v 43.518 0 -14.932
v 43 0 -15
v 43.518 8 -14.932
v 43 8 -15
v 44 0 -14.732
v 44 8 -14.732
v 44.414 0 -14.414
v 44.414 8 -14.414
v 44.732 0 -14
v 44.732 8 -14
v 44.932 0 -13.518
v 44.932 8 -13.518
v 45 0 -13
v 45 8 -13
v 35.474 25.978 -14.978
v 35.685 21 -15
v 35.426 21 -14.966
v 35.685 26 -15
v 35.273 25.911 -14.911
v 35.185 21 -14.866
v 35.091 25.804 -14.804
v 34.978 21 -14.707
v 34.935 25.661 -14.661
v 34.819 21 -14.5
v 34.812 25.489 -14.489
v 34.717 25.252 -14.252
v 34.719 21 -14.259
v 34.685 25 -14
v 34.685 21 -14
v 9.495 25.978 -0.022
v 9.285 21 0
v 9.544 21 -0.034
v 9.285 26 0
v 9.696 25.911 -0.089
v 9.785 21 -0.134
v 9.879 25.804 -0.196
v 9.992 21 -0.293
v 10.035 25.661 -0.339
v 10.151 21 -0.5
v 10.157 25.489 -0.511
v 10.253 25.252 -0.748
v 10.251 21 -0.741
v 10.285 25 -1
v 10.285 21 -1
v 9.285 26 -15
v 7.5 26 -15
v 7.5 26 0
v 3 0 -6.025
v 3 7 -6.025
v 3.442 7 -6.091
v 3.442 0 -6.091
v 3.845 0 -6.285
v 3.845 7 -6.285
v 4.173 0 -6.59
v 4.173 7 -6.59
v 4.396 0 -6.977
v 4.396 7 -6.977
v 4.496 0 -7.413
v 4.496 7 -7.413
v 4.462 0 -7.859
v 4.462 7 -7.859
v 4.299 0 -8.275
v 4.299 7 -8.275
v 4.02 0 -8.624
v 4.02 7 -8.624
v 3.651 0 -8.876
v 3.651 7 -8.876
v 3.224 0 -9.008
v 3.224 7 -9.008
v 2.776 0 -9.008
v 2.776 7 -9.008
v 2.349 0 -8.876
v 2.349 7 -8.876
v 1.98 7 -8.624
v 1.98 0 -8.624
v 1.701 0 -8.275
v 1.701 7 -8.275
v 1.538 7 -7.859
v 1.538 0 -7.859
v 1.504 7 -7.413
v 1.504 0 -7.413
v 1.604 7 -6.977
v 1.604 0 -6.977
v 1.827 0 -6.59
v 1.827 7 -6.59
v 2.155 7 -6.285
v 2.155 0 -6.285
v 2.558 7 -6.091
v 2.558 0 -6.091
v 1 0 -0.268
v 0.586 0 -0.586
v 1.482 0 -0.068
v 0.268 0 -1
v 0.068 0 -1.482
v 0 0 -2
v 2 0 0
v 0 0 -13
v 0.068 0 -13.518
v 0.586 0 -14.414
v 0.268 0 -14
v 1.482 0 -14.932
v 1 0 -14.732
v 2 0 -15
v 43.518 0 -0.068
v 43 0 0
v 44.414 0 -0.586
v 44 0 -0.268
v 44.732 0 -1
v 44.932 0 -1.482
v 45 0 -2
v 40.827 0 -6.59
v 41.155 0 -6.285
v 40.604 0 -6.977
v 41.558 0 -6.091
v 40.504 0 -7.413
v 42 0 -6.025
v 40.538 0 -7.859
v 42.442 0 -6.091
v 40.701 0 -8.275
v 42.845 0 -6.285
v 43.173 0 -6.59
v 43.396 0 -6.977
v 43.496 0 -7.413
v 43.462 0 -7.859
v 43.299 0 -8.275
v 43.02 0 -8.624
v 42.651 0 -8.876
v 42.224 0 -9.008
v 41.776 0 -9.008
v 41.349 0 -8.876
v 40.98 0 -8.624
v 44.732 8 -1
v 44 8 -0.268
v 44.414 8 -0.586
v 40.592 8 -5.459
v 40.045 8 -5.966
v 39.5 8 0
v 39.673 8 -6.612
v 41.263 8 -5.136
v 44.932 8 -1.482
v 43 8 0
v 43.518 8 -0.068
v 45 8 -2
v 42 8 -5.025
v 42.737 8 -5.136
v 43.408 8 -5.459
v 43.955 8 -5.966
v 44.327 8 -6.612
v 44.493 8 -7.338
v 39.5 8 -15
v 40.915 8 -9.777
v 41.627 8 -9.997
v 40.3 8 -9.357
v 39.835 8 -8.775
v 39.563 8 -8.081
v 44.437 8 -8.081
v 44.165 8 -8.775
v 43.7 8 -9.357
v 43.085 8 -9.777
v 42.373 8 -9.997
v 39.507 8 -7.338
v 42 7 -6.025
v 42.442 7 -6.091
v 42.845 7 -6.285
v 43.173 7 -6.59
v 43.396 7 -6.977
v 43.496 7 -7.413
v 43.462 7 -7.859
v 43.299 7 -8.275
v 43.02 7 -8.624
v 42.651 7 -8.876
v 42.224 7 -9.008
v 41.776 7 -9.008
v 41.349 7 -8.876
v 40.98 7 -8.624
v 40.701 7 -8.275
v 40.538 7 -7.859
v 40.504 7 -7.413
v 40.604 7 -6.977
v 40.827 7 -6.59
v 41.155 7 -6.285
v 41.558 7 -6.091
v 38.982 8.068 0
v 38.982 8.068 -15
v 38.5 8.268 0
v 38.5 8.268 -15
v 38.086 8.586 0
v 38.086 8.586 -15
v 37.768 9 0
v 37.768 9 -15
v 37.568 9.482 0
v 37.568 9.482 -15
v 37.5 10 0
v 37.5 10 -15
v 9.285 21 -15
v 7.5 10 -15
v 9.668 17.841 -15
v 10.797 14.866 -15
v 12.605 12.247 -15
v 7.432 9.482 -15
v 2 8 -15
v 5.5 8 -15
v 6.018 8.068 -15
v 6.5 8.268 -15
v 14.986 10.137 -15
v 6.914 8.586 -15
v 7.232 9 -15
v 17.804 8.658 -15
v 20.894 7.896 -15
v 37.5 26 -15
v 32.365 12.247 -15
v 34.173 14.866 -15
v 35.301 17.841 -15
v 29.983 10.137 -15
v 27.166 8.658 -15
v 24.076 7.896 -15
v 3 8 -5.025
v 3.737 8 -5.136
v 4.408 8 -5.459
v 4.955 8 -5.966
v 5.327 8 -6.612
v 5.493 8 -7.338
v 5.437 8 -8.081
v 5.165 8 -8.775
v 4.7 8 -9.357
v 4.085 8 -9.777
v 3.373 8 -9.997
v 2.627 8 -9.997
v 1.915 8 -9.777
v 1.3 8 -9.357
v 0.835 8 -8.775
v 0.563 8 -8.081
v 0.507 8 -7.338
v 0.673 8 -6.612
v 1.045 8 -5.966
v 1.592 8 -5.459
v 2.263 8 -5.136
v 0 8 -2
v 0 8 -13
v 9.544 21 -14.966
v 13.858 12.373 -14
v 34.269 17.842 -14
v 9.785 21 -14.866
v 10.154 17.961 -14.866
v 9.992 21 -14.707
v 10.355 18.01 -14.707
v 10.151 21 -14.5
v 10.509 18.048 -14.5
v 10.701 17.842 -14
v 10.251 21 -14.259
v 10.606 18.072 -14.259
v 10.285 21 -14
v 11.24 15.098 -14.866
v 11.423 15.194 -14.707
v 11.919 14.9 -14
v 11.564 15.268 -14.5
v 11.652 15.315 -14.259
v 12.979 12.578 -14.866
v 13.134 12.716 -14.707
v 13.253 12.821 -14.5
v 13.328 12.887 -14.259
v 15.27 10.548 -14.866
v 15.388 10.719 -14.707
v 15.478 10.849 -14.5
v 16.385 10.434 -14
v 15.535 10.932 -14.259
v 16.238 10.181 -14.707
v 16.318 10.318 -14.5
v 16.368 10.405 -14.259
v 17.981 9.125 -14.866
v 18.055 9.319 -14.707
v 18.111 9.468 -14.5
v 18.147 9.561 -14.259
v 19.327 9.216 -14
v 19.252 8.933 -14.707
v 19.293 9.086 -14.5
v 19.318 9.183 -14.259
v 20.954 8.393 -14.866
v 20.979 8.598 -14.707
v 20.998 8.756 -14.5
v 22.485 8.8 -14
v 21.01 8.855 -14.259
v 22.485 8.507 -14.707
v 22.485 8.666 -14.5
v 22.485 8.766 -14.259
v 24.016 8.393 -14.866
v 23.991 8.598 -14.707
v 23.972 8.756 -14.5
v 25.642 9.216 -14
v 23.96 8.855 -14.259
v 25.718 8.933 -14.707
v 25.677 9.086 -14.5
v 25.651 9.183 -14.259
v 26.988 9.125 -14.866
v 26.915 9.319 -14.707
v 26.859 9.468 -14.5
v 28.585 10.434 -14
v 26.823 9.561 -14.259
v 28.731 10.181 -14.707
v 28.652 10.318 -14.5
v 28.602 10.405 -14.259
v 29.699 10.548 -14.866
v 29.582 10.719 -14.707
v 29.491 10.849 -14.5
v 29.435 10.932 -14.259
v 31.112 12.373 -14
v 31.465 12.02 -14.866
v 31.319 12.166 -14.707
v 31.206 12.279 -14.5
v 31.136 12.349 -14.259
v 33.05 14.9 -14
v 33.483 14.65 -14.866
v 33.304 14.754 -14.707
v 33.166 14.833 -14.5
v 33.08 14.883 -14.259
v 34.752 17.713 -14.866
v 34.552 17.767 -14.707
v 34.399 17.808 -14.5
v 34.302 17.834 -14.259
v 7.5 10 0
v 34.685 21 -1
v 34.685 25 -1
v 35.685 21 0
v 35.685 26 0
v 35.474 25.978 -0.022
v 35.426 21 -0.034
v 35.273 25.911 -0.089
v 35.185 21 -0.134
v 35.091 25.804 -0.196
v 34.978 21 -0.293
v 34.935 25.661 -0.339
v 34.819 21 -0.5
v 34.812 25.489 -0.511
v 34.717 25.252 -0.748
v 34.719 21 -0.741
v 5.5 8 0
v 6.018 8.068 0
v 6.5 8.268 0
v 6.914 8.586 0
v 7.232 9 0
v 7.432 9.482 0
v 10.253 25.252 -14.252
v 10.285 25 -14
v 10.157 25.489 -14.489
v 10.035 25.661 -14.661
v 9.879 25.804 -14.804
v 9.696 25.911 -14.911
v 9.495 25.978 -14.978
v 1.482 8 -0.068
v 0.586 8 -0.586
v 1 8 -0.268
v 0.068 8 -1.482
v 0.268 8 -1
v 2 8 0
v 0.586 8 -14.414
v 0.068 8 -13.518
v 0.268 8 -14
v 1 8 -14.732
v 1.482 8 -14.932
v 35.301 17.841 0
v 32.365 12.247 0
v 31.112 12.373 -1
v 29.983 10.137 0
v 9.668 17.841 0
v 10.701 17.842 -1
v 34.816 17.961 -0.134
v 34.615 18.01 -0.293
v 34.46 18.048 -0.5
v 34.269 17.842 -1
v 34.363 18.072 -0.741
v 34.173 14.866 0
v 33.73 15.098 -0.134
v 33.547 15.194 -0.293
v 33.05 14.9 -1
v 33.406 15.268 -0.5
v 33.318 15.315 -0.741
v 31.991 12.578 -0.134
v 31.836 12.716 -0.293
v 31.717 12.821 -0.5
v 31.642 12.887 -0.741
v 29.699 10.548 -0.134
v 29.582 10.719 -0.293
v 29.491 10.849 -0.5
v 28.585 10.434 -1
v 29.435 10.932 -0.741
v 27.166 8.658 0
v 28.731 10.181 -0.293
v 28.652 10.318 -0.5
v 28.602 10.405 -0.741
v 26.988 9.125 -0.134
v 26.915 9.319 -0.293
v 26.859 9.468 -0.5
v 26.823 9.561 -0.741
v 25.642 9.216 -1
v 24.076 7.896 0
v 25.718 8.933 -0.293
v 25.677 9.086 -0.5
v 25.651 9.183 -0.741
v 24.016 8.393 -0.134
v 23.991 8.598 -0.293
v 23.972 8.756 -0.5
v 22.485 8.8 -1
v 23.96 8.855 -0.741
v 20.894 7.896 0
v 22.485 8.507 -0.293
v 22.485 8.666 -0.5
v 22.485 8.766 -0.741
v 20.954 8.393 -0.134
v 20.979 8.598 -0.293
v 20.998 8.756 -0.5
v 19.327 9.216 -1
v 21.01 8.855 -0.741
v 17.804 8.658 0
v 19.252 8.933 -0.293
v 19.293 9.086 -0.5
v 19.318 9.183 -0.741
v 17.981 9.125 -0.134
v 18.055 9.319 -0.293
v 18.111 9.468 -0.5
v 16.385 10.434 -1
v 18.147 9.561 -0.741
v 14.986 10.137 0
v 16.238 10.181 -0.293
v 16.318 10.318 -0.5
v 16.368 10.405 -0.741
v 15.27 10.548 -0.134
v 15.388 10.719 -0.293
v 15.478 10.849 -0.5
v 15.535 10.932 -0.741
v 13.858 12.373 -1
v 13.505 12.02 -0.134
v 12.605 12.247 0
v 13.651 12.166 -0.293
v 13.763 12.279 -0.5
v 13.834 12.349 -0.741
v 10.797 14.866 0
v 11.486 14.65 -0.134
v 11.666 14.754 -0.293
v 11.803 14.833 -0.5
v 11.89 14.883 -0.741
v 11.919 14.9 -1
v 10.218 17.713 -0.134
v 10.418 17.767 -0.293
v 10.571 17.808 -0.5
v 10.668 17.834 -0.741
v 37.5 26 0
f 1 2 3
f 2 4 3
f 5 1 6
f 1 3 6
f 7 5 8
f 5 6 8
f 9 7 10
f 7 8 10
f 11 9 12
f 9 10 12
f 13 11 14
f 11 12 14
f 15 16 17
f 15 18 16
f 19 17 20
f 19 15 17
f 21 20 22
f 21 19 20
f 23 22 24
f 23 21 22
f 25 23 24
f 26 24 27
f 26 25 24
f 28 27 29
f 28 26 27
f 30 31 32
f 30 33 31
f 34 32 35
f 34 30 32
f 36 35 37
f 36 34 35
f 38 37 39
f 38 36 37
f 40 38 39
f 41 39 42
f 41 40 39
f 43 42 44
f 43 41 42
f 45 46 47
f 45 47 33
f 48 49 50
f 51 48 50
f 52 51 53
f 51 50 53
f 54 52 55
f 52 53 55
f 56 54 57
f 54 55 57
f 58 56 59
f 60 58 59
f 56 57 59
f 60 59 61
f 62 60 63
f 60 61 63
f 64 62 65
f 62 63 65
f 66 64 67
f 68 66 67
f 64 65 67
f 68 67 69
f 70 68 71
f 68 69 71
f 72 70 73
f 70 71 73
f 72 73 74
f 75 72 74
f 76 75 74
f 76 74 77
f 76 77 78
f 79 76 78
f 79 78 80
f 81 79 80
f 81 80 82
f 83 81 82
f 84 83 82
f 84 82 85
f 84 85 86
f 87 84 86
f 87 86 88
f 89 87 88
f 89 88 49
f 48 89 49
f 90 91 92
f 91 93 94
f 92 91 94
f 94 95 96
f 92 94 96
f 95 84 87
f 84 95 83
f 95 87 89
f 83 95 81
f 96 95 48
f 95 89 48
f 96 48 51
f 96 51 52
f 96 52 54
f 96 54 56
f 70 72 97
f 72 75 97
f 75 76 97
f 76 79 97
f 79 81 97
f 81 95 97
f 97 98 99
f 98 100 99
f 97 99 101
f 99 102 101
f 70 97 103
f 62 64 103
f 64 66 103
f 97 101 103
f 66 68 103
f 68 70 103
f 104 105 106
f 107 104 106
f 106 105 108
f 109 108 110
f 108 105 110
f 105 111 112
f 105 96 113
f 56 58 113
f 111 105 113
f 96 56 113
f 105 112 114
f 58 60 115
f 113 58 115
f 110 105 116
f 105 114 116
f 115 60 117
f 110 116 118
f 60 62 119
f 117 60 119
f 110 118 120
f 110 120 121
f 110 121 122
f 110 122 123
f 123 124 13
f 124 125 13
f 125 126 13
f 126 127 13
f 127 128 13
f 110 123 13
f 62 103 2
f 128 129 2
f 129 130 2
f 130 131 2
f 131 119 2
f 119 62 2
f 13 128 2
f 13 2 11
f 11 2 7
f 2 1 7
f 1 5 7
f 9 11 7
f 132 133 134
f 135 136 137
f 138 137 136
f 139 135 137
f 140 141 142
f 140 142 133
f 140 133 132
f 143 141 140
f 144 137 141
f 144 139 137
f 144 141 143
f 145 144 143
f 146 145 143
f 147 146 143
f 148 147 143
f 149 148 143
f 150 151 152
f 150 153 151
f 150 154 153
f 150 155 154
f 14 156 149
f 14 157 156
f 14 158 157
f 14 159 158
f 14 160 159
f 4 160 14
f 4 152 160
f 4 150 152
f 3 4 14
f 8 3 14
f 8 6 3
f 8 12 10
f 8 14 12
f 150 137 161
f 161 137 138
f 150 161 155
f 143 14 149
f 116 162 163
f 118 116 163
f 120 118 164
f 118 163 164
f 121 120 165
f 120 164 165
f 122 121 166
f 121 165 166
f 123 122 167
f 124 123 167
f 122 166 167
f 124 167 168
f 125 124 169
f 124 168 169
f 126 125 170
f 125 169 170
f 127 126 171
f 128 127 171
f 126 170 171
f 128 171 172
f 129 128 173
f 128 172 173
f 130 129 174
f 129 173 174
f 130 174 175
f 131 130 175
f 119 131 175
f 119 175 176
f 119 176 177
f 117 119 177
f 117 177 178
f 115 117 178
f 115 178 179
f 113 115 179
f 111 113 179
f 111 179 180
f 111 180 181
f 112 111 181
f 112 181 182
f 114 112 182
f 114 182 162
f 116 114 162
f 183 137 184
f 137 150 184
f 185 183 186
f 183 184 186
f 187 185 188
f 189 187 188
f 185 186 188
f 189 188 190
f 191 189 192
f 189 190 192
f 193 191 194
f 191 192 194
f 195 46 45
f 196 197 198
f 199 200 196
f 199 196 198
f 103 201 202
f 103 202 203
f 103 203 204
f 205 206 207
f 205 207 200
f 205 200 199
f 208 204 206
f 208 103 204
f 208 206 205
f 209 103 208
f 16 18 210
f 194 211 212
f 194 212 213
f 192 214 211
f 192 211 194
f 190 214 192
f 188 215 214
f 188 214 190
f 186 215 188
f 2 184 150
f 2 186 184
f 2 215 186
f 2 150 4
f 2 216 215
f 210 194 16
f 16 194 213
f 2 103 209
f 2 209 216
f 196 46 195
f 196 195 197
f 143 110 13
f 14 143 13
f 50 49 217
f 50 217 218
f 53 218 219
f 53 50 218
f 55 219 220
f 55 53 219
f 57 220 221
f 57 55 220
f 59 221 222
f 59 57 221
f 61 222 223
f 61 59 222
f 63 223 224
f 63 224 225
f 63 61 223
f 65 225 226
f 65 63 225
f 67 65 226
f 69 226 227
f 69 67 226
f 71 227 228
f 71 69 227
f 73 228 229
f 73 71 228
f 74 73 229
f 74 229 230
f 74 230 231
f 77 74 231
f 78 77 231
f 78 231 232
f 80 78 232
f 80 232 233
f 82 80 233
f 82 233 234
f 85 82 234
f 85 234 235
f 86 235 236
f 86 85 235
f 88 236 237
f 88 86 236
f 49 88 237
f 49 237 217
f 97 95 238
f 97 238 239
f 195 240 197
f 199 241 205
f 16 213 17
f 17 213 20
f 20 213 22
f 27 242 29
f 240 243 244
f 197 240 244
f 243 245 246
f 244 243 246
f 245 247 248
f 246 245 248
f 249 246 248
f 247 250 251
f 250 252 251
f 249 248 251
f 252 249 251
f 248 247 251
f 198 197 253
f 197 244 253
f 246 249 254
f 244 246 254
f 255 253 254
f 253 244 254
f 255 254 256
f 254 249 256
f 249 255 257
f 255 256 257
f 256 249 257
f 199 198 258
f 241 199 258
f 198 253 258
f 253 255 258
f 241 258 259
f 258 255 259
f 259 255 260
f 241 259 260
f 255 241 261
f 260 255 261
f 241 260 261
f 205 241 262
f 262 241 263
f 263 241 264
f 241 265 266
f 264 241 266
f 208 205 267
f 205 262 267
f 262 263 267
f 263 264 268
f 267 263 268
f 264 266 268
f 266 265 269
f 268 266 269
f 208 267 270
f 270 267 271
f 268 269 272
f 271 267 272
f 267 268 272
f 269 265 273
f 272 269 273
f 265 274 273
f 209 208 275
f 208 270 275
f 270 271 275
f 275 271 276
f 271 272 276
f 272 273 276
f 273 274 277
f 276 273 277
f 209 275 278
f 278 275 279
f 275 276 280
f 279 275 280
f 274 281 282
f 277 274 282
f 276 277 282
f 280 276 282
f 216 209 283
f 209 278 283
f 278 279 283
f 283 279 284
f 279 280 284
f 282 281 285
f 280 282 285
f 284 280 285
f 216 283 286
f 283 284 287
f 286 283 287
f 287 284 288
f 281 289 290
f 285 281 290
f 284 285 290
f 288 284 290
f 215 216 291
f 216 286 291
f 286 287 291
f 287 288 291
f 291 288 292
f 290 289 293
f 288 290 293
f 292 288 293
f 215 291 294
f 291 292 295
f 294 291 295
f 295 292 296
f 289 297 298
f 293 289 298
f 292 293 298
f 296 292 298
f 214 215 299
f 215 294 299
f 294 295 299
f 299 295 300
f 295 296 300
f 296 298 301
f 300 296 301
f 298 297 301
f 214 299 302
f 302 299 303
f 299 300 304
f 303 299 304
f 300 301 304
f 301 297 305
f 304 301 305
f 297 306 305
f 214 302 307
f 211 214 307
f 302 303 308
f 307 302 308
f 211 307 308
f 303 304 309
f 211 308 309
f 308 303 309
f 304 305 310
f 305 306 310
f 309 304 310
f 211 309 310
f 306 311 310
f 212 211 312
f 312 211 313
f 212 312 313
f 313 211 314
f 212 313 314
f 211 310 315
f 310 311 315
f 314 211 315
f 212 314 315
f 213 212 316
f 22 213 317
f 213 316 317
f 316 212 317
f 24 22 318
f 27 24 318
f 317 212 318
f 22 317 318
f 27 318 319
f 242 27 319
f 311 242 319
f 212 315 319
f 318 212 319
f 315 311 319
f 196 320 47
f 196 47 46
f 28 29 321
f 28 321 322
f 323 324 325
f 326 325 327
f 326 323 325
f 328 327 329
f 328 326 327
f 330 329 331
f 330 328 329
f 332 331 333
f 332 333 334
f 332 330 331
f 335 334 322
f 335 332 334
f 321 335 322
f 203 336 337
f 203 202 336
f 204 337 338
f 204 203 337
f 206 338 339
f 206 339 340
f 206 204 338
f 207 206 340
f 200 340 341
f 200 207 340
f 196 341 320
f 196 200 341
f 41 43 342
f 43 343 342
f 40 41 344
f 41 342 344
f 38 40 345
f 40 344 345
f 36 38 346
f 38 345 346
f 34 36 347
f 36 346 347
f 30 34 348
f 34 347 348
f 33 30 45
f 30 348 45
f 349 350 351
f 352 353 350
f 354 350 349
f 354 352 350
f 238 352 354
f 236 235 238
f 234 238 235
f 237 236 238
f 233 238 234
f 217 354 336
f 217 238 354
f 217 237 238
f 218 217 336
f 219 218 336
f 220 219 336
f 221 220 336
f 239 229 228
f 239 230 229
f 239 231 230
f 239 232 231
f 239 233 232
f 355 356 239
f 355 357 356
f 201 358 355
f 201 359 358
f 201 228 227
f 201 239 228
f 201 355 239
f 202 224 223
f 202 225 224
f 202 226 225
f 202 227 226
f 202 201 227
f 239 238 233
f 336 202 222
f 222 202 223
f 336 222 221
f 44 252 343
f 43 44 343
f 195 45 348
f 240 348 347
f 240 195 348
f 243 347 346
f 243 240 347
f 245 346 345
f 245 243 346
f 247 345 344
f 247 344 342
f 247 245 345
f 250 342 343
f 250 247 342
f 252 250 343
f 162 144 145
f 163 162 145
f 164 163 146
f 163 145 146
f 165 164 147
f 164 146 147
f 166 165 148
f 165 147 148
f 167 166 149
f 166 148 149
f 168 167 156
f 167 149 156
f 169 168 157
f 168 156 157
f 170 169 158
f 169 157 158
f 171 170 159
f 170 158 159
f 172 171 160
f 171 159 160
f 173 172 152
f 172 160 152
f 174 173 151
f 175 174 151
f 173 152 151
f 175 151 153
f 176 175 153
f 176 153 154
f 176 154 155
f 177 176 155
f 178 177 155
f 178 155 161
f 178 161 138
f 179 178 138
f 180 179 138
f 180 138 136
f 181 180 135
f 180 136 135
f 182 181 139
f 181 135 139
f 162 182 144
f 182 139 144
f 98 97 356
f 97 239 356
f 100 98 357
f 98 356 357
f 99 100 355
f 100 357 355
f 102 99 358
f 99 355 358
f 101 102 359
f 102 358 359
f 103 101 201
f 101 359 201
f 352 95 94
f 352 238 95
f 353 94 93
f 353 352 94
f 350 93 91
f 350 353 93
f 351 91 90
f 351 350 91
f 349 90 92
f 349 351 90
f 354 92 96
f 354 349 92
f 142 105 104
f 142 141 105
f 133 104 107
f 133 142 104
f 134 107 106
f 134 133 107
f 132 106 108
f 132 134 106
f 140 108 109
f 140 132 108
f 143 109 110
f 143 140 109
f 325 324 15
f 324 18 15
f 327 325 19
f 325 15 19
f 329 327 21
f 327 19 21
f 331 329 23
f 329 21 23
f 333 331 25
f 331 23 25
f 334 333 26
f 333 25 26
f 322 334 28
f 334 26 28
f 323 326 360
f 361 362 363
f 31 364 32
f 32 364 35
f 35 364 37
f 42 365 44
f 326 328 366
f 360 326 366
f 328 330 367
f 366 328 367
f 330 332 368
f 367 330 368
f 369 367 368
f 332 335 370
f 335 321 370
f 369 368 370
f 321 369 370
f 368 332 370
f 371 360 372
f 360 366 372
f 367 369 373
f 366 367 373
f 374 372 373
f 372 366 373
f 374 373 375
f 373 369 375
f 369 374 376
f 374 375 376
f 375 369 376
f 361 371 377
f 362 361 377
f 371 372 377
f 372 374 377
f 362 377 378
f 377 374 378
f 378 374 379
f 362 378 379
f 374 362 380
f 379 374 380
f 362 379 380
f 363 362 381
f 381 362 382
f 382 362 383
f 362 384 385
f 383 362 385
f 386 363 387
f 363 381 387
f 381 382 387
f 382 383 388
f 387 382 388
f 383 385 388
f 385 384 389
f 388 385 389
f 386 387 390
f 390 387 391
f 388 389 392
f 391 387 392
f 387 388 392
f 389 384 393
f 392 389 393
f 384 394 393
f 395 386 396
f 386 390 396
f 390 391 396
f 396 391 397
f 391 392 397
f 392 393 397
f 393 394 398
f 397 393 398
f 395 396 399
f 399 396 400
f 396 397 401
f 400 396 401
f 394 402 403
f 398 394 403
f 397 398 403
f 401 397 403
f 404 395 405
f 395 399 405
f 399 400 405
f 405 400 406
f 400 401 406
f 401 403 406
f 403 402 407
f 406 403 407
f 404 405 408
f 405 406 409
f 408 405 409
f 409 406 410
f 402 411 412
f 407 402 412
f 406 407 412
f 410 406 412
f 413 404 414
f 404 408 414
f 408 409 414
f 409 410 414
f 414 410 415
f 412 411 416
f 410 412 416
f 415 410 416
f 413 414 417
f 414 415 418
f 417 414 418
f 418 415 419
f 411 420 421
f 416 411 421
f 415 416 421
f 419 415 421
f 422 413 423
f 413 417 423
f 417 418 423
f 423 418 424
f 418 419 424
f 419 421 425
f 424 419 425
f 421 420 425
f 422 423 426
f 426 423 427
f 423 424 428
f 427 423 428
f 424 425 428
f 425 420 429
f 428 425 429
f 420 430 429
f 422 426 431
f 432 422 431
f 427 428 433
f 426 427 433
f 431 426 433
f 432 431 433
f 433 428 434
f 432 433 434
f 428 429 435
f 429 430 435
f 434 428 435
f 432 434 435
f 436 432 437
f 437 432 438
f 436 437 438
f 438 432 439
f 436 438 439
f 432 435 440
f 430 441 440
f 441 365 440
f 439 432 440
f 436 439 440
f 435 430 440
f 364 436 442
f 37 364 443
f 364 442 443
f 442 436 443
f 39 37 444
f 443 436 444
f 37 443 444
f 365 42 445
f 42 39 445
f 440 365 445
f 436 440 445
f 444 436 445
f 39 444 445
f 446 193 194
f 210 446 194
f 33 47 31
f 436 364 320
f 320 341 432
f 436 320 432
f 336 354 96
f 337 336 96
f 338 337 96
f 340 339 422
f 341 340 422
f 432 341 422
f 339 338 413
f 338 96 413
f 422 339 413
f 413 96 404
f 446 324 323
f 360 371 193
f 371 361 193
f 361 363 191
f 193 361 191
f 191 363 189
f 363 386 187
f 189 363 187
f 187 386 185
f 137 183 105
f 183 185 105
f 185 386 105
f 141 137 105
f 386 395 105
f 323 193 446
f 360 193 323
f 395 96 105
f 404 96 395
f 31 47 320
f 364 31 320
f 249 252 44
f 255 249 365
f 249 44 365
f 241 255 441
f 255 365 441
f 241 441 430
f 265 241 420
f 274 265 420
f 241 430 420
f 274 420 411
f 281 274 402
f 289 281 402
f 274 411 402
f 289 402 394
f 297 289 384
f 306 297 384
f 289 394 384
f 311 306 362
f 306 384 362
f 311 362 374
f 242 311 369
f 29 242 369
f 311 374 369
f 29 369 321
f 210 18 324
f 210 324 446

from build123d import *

# Parameters (mm, degrees)
SKETCH1_W           = 45
SKETCH1_H           = 15
BOSS_EXTRUDE1_DEPTH = 8
SKETCH2_W           = 30
SKETCH2_H           = 15
BOSS_EXTRUDE2_DEPTH = 18
FILLET1_R           = 2
SKETCH3_R           = 1.5
CUT_EXTRUDE1_DEPTH  = 20
CHAMFER1_SIZE       = 1
SKETCH13_R          = 12.2
CUT_EXTRUDE4_DEPTH  = 20
SKETCH14_W          = 24.4
SKETCH14_H          = 5
CUT_EXTRUDE5_DEPTH  = 20
FILLET4_R           = 1


with BuildPart() as part:
    # Sketch1 → Boss-Extrude1 (new body)
    with BuildSketch(Plane(origin=(0, 0, 0), x_dir=(1, 0, 0), z_dir=(0, 1, 0))):
        with Locations((22.5, 7.5)):
            Rectangle(SKETCH1_W, SKETCH1_H)
    extrude(amount=BOSS_EXTRUDE1_DEPTH)

    # Sketch2 → Boss-Extrude2 (add)
    with BuildSketch(Plane(origin=(0, 8, 0), x_dir=(1, 0, 0), z_dir=(0, 1, 0))):
        with Locations((22.5, 7.5)):
            Rectangle(SKETCH2_W, SKETCH2_H)
    extrude(amount=BOSS_EXTRUDE2_DEPTH)

    # Fillet1
    fillet1_edges = [part.edges().sort_by_distance(p)[0] for p in [
        (7.5, 8, -7.5),
        (37.5, 8, -7.5),
        (0, 4, 0),
        (0, 4, -15),
        (45, 4, -15),
        (45, 4, 0),
    ]]
    fillet(fillet1_edges, radius=FILLET1_R)

    # Sketch3 → Cut-Extrude1 (cut)
    with BuildSketch(Plane(origin=(0, 8, 0), x_dir=(1, 0, 0), z_dir=(0, 1, 0))):
        with Locations(Location((3, 7.524826623, 0), (0, 0, 270))):
            Circle(SKETCH3_R)
        with Locations(Location((42, 7.524826623, 0), (0, 0, 270))):
            Circle(SKETCH3_R)
    extrude(amount=-CUT_EXTRUDE1_DEPTH, mode=Mode.SUBTRACT)

    # Chamfer1
    chamfer1_edges = [part.edges().sort_by_distance(p)[0] for p in [
        (3, 8, -9.024826623),
        (42, 8, -9.024826623),
    ]]
    chamfer(chamfer1_edges, length=CHAMFER1_SIZE - 0.0001)  # a hair under: the kernel refuses the full size

    # Sketch13 → Cut-Extrude4 (cut)
    with BuildSketch(Plane.XY):
        with Locations((22.484903529, 21)):
            Circle(SKETCH13_R)
    extrude(amount=-CUT_EXTRUDE4_DEPTH, mode=Mode.SUBTRACT)

    # Sketch14 → Cut-Extrude5 (cut)
    with BuildSketch(Plane.XY):
        with Locations((22.484903529, 23.5)):
            Rectangle(SKETCH14_W, SKETCH14_H)
    extrude(amount=-CUT_EXTRUDE5_DEPTH, mode=Mode.SUBTRACT)

    # Fillet4
    fillet4_edges = [part.edges().sort_by_distance(p)[0] for p in [
        (22.484903529, 8.8, 0),
        (22.484903529, 8.8, -15),
        (10.284903529, 23.5, -15),
        (10.284903529, 26, -7.5),
        (34.684903529, 23.5, -15),
        (34.684903529, 26, -7.5),
        (10.284903529, 23.5, 0),
        (34.684903529, 23.5, 0),
    ]]
    fillet(fillet4_edges, radius=FILLET4_R)


solid = part.part
